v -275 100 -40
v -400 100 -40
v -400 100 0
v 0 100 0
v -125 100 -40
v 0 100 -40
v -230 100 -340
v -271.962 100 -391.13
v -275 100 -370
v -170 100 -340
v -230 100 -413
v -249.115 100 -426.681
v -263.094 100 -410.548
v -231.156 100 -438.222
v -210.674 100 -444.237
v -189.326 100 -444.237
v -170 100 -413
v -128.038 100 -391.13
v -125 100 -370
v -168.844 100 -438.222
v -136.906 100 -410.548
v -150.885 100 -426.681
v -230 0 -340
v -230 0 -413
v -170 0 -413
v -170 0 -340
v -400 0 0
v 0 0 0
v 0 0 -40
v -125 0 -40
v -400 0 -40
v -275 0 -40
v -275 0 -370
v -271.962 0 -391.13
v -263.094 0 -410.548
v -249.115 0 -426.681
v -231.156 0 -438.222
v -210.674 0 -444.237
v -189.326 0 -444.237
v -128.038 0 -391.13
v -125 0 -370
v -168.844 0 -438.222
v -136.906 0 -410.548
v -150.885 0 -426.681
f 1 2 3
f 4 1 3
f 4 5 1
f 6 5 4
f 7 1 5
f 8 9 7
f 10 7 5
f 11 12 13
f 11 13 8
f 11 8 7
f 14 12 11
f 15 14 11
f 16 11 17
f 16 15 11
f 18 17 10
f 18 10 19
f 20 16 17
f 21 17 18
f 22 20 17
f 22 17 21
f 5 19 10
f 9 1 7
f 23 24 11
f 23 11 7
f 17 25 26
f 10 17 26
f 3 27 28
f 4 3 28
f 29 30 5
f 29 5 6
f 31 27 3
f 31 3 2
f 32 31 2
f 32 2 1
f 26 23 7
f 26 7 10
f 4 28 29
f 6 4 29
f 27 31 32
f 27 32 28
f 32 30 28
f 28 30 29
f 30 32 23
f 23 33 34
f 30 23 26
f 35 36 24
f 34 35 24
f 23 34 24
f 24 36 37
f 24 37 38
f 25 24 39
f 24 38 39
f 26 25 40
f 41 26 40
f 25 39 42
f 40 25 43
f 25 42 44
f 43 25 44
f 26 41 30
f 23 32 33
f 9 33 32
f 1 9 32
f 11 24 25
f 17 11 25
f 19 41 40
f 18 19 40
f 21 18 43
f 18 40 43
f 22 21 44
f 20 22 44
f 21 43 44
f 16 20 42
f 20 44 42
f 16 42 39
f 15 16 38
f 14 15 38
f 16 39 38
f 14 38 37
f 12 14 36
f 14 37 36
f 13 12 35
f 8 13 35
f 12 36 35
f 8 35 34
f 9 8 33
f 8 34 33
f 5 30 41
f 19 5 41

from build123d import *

# Parameters (mm, degrees)
CROQUIS2_R              = 75
CROQUIS2_R_2            = 25
CROQUIS2_W              = 400
CROQUIS2_H              = 40
SALIENTE_EXTRUIR1_DEPTH = 100
CROQUIS3_W              = 60
CROQUIS3_H              = 73
CORTAR_EXTRUIR1_DEPTH   = 107


with BuildPart() as part:
    # Croquis2 → Saliente-Extruir1 (new body)
    # profile 1 of 3: a face of its own
    with BuildSketch(Plane(origin=(0, 0, 0), x_dir=(1, 0, 0), z_dir=(0, 1, 0))):
        with Locations((-200, 370)):
            Circle(CROQUIS2_R)
        with Locations(Location((-200, 370, 0), (0, 0, 270))):
            Circle(CROQUIS2_R_2, mode=Mode.SUBTRACT)
    # profile 2 of 3: a face of its own
    with BuildSketch(Plane(origin=(0, 0, 0), x_dir=(1, 0, 0), z_dir=(0, 1, 0))):
        with BuildLine():
            Line((-275, 345), (-275, 40))
            Line((-275, 40), (-200, 40))
            Line((-200, 40), (-125, 40))
            Line((-125, 40), (-125, 345))
            Line((-125, 345), (-125, 370))
            ThreePointArc((-125, 370), (-200, 295), (-275, 370))
            Line((-275, 370), (-275, 345))
        make_face()
    # profile 3 of 3: a face of its own
    with BuildSketch(Plane(origin=(0, 0, 0), x_dir=(1, 0, 0), z_dir=(0, 1, 0))):
        with Locations((-200, 20)):
            Rectangle(CROQUIS2_W, CROQUIS2_H)
    extrude(amount=SALIENTE_EXTRUIR1_DEPTH)

    # Croquis3 → Cortar-Extruir1 (cut)
    with BuildSketch(Plane.XZ):
        with Locations((-200, -376.5)):
            Rectangle(CROQUIS3_W, CROQUIS3_H)
    extrude(amount=-CORTAR_EXTRUIR1_DEPTH, mode=Mode.SUBTRACT)


solid = part.part
